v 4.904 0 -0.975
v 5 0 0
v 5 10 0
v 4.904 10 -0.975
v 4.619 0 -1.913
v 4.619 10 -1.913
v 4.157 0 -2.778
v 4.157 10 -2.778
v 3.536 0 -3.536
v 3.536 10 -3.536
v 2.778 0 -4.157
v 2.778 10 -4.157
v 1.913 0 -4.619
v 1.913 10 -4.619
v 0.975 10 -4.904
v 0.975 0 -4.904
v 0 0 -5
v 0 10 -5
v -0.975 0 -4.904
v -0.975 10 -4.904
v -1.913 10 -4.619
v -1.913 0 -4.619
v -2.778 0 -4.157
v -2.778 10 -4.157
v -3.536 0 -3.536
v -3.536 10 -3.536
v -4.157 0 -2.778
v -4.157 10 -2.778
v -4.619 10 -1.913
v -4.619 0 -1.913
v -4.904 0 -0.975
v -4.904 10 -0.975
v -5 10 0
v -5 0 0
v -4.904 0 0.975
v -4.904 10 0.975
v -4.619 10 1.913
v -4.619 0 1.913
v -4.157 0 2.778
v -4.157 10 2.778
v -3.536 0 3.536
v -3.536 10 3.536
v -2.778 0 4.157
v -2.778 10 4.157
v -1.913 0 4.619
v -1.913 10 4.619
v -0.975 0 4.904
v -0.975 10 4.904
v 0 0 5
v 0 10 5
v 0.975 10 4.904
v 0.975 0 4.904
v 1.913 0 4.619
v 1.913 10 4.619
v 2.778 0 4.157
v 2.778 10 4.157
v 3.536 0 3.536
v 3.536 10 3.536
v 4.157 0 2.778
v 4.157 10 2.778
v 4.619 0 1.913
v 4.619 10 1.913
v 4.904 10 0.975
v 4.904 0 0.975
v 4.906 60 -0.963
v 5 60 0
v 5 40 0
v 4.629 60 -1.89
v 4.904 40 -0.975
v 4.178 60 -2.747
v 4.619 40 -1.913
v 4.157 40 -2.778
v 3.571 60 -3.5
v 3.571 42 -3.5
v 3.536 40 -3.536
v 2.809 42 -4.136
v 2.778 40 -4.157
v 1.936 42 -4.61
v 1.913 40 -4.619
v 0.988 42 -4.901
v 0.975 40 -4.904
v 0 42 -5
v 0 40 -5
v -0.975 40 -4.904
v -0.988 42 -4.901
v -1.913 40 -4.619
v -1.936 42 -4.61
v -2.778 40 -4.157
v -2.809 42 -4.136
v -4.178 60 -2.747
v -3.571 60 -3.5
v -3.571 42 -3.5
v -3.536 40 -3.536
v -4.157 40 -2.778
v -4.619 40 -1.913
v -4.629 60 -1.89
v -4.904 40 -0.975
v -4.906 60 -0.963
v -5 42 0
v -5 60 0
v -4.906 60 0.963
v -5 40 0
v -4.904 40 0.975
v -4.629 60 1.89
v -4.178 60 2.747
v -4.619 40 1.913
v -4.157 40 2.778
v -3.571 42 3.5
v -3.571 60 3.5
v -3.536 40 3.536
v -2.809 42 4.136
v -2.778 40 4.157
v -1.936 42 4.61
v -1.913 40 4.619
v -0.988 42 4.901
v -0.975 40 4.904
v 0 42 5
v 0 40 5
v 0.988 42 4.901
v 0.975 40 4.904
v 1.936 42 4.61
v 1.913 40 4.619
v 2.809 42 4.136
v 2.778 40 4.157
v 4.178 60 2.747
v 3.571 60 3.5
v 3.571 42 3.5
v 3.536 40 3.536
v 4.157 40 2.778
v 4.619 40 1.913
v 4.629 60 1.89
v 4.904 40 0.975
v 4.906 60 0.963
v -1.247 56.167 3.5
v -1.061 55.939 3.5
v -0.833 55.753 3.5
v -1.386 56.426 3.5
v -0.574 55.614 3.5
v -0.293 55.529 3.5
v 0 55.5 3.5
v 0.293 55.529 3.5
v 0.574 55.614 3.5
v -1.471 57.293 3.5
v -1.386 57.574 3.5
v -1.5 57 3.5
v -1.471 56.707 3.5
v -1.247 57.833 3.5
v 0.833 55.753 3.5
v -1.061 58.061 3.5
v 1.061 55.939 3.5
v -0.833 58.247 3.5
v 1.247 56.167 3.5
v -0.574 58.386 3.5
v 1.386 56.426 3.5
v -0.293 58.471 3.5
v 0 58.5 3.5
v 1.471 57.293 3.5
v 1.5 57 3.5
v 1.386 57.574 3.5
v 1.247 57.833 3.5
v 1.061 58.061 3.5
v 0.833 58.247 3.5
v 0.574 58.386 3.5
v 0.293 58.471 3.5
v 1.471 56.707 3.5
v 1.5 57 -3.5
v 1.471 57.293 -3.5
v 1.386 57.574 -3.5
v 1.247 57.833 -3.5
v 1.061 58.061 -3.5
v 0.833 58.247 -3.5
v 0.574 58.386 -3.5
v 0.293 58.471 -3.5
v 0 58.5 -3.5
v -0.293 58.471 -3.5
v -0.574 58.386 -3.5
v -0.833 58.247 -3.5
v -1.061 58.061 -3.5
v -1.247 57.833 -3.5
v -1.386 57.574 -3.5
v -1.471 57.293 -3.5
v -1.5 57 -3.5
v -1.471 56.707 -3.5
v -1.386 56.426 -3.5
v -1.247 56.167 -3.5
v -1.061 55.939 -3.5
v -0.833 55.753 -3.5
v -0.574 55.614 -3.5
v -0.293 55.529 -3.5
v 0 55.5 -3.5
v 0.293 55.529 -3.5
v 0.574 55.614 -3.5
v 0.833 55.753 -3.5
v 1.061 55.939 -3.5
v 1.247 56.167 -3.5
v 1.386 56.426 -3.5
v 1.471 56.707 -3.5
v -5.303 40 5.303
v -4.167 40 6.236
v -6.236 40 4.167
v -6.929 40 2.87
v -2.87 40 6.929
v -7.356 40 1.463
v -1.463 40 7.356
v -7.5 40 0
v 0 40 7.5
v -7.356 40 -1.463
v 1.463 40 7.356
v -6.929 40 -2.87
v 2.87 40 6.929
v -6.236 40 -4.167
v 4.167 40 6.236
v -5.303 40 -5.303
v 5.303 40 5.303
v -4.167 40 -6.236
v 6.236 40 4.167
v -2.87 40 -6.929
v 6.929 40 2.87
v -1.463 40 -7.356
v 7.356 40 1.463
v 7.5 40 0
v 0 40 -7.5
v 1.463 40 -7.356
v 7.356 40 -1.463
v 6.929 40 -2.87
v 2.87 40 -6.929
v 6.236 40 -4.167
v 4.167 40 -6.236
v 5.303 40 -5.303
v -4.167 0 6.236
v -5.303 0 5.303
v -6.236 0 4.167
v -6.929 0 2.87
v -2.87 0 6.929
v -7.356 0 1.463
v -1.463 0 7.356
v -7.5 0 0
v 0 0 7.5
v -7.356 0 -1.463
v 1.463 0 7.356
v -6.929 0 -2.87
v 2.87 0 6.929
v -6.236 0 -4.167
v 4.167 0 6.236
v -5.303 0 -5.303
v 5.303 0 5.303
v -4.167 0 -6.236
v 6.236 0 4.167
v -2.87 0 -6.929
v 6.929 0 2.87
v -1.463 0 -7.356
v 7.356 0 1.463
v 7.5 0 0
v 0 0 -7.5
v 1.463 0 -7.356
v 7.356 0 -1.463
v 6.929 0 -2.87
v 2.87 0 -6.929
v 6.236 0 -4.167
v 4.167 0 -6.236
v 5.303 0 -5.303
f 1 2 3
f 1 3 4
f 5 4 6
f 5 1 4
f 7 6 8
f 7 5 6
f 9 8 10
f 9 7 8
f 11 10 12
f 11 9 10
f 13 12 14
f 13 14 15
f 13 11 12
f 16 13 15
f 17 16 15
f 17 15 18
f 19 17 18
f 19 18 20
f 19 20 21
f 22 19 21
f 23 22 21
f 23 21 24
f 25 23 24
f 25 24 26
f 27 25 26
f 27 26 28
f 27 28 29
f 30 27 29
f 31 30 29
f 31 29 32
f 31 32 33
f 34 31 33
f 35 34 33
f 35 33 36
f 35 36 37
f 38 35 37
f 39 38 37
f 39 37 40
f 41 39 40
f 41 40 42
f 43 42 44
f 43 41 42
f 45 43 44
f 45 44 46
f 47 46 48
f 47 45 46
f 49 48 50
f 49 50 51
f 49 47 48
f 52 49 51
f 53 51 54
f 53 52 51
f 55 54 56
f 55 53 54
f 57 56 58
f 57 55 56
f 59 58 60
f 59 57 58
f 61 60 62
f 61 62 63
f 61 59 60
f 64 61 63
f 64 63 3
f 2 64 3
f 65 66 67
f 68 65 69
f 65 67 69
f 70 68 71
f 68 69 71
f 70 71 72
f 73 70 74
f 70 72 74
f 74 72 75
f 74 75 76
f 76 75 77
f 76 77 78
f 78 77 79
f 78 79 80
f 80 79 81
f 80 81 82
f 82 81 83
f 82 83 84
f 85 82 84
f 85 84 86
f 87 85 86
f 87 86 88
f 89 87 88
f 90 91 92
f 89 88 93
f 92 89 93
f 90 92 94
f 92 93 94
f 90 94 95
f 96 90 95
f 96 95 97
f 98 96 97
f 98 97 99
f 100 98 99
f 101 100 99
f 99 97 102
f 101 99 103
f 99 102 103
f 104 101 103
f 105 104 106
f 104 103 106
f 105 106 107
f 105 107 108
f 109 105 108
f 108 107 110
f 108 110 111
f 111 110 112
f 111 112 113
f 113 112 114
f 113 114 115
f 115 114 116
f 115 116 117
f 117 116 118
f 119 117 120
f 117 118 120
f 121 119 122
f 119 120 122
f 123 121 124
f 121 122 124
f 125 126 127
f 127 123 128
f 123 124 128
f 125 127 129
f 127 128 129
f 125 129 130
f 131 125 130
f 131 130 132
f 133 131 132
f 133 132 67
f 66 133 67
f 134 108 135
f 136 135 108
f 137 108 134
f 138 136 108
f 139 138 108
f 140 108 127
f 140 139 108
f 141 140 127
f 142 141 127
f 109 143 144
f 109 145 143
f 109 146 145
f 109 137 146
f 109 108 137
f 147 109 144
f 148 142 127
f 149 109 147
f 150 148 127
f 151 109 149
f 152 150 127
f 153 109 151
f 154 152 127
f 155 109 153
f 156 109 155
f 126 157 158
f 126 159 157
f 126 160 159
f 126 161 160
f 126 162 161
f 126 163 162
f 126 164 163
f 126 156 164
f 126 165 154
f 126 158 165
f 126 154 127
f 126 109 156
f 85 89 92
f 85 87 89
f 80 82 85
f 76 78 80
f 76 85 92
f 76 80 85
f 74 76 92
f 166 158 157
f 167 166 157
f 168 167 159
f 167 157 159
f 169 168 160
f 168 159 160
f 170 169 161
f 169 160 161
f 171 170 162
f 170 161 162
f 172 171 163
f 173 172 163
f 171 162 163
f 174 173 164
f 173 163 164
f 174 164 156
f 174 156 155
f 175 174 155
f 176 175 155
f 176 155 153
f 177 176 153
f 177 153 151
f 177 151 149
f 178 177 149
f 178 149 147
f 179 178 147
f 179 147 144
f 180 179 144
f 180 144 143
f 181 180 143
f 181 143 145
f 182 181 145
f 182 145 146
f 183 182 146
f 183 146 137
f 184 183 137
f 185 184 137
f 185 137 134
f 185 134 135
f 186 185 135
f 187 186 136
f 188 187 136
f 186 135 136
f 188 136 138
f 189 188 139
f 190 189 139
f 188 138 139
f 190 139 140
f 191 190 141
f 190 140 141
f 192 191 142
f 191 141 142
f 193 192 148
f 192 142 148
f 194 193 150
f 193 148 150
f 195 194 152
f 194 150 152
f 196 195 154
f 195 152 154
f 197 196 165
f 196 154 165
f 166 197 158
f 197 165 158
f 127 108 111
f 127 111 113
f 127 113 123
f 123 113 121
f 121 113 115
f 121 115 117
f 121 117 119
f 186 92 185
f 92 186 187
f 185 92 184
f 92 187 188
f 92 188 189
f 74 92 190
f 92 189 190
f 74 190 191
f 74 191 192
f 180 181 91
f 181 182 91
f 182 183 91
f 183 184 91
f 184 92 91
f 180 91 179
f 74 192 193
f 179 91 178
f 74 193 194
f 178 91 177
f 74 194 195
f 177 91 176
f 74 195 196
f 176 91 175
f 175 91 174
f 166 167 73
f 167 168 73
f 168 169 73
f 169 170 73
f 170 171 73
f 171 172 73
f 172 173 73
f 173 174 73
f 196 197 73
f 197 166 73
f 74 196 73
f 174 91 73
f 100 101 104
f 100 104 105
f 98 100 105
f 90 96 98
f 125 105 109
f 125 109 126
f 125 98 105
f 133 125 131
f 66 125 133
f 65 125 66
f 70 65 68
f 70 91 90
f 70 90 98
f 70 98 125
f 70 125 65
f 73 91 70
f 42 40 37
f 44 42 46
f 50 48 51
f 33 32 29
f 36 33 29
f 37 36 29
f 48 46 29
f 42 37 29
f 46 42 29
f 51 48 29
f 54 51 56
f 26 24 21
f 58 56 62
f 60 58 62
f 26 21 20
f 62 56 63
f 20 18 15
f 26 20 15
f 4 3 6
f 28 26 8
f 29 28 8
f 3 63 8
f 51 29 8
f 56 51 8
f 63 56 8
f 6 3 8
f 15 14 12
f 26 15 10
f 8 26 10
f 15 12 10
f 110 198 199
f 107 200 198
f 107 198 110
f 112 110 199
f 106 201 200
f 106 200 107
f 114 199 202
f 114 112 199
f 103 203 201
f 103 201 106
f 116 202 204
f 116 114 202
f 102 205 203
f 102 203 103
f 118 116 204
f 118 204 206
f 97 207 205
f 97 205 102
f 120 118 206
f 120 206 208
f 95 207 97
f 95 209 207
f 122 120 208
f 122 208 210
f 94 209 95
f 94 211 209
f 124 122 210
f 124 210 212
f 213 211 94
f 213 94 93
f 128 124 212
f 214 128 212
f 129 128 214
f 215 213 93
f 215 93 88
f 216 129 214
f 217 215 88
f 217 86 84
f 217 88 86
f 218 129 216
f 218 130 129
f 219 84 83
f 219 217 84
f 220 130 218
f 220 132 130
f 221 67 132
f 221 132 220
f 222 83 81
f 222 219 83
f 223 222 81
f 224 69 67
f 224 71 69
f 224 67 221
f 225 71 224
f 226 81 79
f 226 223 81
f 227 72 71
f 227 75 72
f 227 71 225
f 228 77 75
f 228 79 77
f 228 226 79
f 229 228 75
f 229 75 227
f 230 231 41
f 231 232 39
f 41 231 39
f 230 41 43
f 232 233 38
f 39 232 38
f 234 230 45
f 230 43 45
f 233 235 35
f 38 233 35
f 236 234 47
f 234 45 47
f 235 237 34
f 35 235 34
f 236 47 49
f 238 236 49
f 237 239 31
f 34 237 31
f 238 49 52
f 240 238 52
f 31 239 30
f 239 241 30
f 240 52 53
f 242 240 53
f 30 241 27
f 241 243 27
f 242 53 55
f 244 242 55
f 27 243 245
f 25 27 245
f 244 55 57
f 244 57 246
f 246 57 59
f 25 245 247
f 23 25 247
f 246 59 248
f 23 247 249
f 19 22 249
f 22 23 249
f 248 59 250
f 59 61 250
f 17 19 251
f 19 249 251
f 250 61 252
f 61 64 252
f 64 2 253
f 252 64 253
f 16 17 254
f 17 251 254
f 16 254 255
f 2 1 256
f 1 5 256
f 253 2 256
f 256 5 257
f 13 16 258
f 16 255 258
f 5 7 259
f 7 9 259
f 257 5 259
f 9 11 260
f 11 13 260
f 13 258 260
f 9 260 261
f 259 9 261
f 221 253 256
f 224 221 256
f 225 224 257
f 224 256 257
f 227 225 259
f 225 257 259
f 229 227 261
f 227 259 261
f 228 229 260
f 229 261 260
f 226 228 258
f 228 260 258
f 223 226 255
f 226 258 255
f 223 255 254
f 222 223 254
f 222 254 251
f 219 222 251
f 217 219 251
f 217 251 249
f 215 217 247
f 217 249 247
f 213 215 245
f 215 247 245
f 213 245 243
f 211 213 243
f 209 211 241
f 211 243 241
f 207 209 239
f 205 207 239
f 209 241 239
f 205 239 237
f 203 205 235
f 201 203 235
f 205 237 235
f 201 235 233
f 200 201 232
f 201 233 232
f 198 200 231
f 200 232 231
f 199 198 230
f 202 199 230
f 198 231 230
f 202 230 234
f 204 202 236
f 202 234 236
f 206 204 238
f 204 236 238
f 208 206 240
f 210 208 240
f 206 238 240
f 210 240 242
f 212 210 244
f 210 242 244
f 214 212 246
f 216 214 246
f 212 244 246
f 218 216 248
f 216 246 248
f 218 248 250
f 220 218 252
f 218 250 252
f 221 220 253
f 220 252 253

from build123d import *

# Parameters (mm, degrees)
SZKIC1_R                    = 7.5
SZKIC1_R_2                  = 5
DODANIE_WYCI_GNI_CIE1_DEPTH = 40
DODANIE_WYCI_GNI_CIE2_START = 10
SZKIC1_2_R                  = 5
DODANIE_WYCI_GNI_CIE2_DEPTH = 50
SZKIC2_OUTSIDE_W            = 29.728
SZKIC2_OUTSIDE_H            = 29.728
SZKIC2_OUTSIDE_W_2          = 10
SZKIC2_OUTSIDE_H_2          = 7
WYTNIJ_WYCI_GNI_CIE1_DEPTH  = 18
SZKIC3_R                    = 1.5
WYTNIJ_WYCI_GNI_CIE2_DEPTH  = 10


with BuildPart() as part:
    # Szkic1 → Dodanie-wyci_gni_cie1 (new body)
    with BuildSketch(Plane(origin=(0, 0, 0), x_dir=(1, 0, 0), z_dir=(0, 1, 0))):
        Circle(SZKIC1_R)
        Circle(SZKIC1_R_2, mode=Mode.SUBTRACT)
    extrude(amount=DODANIE_WYCI_GNI_CIE1_DEPTH)

    # Szkic1_2 → Dodanie-wyci_gni_cie2 (add)
    with BuildSketch(Plane(origin=(0, 0, 0), x_dir=(1, 0, 0), z_dir=(0, 1, 0)).offset(DODANIE_WYCI_GNI_CIE2_START)):
        Circle(SZKIC1_2_R)
    extrude(amount=DODANIE_WYCI_GNI_CIE2_DEPTH)

    # Szkic2 outside → Wytnij-wyci_gni_cie1 (cut)
    with BuildSketch(Plane(origin=(0, 60, 0), x_dir=(1, 0, 0), z_dir=(0, 1, 0))):
        Rectangle(SZKIC2_OUTSIDE_W, SZKIC2_OUTSIDE_H)
        Rectangle(SZKIC2_OUTSIDE_W_2, SZKIC2_OUTSIDE_H_2, mode=Mode.SUBTRACT)
    extrude(amount=-WYTNIJ_WYCI_GNI_CIE1_DEPTH, mode=Mode.SUBTRACT)

    # Szkic3 → Wytnij-wyci_gni_cie2 (cut)
    with BuildSketch(Plane.XY.offset(3.5)):
        with Locations((0, 57)):
            Circle(SZKIC3_R)
    extrude(amount=-WYTNIJ_WYCI_GNI_CIE2_DEPTH, mode=Mode.SUBTRACT)


solid = part.part
